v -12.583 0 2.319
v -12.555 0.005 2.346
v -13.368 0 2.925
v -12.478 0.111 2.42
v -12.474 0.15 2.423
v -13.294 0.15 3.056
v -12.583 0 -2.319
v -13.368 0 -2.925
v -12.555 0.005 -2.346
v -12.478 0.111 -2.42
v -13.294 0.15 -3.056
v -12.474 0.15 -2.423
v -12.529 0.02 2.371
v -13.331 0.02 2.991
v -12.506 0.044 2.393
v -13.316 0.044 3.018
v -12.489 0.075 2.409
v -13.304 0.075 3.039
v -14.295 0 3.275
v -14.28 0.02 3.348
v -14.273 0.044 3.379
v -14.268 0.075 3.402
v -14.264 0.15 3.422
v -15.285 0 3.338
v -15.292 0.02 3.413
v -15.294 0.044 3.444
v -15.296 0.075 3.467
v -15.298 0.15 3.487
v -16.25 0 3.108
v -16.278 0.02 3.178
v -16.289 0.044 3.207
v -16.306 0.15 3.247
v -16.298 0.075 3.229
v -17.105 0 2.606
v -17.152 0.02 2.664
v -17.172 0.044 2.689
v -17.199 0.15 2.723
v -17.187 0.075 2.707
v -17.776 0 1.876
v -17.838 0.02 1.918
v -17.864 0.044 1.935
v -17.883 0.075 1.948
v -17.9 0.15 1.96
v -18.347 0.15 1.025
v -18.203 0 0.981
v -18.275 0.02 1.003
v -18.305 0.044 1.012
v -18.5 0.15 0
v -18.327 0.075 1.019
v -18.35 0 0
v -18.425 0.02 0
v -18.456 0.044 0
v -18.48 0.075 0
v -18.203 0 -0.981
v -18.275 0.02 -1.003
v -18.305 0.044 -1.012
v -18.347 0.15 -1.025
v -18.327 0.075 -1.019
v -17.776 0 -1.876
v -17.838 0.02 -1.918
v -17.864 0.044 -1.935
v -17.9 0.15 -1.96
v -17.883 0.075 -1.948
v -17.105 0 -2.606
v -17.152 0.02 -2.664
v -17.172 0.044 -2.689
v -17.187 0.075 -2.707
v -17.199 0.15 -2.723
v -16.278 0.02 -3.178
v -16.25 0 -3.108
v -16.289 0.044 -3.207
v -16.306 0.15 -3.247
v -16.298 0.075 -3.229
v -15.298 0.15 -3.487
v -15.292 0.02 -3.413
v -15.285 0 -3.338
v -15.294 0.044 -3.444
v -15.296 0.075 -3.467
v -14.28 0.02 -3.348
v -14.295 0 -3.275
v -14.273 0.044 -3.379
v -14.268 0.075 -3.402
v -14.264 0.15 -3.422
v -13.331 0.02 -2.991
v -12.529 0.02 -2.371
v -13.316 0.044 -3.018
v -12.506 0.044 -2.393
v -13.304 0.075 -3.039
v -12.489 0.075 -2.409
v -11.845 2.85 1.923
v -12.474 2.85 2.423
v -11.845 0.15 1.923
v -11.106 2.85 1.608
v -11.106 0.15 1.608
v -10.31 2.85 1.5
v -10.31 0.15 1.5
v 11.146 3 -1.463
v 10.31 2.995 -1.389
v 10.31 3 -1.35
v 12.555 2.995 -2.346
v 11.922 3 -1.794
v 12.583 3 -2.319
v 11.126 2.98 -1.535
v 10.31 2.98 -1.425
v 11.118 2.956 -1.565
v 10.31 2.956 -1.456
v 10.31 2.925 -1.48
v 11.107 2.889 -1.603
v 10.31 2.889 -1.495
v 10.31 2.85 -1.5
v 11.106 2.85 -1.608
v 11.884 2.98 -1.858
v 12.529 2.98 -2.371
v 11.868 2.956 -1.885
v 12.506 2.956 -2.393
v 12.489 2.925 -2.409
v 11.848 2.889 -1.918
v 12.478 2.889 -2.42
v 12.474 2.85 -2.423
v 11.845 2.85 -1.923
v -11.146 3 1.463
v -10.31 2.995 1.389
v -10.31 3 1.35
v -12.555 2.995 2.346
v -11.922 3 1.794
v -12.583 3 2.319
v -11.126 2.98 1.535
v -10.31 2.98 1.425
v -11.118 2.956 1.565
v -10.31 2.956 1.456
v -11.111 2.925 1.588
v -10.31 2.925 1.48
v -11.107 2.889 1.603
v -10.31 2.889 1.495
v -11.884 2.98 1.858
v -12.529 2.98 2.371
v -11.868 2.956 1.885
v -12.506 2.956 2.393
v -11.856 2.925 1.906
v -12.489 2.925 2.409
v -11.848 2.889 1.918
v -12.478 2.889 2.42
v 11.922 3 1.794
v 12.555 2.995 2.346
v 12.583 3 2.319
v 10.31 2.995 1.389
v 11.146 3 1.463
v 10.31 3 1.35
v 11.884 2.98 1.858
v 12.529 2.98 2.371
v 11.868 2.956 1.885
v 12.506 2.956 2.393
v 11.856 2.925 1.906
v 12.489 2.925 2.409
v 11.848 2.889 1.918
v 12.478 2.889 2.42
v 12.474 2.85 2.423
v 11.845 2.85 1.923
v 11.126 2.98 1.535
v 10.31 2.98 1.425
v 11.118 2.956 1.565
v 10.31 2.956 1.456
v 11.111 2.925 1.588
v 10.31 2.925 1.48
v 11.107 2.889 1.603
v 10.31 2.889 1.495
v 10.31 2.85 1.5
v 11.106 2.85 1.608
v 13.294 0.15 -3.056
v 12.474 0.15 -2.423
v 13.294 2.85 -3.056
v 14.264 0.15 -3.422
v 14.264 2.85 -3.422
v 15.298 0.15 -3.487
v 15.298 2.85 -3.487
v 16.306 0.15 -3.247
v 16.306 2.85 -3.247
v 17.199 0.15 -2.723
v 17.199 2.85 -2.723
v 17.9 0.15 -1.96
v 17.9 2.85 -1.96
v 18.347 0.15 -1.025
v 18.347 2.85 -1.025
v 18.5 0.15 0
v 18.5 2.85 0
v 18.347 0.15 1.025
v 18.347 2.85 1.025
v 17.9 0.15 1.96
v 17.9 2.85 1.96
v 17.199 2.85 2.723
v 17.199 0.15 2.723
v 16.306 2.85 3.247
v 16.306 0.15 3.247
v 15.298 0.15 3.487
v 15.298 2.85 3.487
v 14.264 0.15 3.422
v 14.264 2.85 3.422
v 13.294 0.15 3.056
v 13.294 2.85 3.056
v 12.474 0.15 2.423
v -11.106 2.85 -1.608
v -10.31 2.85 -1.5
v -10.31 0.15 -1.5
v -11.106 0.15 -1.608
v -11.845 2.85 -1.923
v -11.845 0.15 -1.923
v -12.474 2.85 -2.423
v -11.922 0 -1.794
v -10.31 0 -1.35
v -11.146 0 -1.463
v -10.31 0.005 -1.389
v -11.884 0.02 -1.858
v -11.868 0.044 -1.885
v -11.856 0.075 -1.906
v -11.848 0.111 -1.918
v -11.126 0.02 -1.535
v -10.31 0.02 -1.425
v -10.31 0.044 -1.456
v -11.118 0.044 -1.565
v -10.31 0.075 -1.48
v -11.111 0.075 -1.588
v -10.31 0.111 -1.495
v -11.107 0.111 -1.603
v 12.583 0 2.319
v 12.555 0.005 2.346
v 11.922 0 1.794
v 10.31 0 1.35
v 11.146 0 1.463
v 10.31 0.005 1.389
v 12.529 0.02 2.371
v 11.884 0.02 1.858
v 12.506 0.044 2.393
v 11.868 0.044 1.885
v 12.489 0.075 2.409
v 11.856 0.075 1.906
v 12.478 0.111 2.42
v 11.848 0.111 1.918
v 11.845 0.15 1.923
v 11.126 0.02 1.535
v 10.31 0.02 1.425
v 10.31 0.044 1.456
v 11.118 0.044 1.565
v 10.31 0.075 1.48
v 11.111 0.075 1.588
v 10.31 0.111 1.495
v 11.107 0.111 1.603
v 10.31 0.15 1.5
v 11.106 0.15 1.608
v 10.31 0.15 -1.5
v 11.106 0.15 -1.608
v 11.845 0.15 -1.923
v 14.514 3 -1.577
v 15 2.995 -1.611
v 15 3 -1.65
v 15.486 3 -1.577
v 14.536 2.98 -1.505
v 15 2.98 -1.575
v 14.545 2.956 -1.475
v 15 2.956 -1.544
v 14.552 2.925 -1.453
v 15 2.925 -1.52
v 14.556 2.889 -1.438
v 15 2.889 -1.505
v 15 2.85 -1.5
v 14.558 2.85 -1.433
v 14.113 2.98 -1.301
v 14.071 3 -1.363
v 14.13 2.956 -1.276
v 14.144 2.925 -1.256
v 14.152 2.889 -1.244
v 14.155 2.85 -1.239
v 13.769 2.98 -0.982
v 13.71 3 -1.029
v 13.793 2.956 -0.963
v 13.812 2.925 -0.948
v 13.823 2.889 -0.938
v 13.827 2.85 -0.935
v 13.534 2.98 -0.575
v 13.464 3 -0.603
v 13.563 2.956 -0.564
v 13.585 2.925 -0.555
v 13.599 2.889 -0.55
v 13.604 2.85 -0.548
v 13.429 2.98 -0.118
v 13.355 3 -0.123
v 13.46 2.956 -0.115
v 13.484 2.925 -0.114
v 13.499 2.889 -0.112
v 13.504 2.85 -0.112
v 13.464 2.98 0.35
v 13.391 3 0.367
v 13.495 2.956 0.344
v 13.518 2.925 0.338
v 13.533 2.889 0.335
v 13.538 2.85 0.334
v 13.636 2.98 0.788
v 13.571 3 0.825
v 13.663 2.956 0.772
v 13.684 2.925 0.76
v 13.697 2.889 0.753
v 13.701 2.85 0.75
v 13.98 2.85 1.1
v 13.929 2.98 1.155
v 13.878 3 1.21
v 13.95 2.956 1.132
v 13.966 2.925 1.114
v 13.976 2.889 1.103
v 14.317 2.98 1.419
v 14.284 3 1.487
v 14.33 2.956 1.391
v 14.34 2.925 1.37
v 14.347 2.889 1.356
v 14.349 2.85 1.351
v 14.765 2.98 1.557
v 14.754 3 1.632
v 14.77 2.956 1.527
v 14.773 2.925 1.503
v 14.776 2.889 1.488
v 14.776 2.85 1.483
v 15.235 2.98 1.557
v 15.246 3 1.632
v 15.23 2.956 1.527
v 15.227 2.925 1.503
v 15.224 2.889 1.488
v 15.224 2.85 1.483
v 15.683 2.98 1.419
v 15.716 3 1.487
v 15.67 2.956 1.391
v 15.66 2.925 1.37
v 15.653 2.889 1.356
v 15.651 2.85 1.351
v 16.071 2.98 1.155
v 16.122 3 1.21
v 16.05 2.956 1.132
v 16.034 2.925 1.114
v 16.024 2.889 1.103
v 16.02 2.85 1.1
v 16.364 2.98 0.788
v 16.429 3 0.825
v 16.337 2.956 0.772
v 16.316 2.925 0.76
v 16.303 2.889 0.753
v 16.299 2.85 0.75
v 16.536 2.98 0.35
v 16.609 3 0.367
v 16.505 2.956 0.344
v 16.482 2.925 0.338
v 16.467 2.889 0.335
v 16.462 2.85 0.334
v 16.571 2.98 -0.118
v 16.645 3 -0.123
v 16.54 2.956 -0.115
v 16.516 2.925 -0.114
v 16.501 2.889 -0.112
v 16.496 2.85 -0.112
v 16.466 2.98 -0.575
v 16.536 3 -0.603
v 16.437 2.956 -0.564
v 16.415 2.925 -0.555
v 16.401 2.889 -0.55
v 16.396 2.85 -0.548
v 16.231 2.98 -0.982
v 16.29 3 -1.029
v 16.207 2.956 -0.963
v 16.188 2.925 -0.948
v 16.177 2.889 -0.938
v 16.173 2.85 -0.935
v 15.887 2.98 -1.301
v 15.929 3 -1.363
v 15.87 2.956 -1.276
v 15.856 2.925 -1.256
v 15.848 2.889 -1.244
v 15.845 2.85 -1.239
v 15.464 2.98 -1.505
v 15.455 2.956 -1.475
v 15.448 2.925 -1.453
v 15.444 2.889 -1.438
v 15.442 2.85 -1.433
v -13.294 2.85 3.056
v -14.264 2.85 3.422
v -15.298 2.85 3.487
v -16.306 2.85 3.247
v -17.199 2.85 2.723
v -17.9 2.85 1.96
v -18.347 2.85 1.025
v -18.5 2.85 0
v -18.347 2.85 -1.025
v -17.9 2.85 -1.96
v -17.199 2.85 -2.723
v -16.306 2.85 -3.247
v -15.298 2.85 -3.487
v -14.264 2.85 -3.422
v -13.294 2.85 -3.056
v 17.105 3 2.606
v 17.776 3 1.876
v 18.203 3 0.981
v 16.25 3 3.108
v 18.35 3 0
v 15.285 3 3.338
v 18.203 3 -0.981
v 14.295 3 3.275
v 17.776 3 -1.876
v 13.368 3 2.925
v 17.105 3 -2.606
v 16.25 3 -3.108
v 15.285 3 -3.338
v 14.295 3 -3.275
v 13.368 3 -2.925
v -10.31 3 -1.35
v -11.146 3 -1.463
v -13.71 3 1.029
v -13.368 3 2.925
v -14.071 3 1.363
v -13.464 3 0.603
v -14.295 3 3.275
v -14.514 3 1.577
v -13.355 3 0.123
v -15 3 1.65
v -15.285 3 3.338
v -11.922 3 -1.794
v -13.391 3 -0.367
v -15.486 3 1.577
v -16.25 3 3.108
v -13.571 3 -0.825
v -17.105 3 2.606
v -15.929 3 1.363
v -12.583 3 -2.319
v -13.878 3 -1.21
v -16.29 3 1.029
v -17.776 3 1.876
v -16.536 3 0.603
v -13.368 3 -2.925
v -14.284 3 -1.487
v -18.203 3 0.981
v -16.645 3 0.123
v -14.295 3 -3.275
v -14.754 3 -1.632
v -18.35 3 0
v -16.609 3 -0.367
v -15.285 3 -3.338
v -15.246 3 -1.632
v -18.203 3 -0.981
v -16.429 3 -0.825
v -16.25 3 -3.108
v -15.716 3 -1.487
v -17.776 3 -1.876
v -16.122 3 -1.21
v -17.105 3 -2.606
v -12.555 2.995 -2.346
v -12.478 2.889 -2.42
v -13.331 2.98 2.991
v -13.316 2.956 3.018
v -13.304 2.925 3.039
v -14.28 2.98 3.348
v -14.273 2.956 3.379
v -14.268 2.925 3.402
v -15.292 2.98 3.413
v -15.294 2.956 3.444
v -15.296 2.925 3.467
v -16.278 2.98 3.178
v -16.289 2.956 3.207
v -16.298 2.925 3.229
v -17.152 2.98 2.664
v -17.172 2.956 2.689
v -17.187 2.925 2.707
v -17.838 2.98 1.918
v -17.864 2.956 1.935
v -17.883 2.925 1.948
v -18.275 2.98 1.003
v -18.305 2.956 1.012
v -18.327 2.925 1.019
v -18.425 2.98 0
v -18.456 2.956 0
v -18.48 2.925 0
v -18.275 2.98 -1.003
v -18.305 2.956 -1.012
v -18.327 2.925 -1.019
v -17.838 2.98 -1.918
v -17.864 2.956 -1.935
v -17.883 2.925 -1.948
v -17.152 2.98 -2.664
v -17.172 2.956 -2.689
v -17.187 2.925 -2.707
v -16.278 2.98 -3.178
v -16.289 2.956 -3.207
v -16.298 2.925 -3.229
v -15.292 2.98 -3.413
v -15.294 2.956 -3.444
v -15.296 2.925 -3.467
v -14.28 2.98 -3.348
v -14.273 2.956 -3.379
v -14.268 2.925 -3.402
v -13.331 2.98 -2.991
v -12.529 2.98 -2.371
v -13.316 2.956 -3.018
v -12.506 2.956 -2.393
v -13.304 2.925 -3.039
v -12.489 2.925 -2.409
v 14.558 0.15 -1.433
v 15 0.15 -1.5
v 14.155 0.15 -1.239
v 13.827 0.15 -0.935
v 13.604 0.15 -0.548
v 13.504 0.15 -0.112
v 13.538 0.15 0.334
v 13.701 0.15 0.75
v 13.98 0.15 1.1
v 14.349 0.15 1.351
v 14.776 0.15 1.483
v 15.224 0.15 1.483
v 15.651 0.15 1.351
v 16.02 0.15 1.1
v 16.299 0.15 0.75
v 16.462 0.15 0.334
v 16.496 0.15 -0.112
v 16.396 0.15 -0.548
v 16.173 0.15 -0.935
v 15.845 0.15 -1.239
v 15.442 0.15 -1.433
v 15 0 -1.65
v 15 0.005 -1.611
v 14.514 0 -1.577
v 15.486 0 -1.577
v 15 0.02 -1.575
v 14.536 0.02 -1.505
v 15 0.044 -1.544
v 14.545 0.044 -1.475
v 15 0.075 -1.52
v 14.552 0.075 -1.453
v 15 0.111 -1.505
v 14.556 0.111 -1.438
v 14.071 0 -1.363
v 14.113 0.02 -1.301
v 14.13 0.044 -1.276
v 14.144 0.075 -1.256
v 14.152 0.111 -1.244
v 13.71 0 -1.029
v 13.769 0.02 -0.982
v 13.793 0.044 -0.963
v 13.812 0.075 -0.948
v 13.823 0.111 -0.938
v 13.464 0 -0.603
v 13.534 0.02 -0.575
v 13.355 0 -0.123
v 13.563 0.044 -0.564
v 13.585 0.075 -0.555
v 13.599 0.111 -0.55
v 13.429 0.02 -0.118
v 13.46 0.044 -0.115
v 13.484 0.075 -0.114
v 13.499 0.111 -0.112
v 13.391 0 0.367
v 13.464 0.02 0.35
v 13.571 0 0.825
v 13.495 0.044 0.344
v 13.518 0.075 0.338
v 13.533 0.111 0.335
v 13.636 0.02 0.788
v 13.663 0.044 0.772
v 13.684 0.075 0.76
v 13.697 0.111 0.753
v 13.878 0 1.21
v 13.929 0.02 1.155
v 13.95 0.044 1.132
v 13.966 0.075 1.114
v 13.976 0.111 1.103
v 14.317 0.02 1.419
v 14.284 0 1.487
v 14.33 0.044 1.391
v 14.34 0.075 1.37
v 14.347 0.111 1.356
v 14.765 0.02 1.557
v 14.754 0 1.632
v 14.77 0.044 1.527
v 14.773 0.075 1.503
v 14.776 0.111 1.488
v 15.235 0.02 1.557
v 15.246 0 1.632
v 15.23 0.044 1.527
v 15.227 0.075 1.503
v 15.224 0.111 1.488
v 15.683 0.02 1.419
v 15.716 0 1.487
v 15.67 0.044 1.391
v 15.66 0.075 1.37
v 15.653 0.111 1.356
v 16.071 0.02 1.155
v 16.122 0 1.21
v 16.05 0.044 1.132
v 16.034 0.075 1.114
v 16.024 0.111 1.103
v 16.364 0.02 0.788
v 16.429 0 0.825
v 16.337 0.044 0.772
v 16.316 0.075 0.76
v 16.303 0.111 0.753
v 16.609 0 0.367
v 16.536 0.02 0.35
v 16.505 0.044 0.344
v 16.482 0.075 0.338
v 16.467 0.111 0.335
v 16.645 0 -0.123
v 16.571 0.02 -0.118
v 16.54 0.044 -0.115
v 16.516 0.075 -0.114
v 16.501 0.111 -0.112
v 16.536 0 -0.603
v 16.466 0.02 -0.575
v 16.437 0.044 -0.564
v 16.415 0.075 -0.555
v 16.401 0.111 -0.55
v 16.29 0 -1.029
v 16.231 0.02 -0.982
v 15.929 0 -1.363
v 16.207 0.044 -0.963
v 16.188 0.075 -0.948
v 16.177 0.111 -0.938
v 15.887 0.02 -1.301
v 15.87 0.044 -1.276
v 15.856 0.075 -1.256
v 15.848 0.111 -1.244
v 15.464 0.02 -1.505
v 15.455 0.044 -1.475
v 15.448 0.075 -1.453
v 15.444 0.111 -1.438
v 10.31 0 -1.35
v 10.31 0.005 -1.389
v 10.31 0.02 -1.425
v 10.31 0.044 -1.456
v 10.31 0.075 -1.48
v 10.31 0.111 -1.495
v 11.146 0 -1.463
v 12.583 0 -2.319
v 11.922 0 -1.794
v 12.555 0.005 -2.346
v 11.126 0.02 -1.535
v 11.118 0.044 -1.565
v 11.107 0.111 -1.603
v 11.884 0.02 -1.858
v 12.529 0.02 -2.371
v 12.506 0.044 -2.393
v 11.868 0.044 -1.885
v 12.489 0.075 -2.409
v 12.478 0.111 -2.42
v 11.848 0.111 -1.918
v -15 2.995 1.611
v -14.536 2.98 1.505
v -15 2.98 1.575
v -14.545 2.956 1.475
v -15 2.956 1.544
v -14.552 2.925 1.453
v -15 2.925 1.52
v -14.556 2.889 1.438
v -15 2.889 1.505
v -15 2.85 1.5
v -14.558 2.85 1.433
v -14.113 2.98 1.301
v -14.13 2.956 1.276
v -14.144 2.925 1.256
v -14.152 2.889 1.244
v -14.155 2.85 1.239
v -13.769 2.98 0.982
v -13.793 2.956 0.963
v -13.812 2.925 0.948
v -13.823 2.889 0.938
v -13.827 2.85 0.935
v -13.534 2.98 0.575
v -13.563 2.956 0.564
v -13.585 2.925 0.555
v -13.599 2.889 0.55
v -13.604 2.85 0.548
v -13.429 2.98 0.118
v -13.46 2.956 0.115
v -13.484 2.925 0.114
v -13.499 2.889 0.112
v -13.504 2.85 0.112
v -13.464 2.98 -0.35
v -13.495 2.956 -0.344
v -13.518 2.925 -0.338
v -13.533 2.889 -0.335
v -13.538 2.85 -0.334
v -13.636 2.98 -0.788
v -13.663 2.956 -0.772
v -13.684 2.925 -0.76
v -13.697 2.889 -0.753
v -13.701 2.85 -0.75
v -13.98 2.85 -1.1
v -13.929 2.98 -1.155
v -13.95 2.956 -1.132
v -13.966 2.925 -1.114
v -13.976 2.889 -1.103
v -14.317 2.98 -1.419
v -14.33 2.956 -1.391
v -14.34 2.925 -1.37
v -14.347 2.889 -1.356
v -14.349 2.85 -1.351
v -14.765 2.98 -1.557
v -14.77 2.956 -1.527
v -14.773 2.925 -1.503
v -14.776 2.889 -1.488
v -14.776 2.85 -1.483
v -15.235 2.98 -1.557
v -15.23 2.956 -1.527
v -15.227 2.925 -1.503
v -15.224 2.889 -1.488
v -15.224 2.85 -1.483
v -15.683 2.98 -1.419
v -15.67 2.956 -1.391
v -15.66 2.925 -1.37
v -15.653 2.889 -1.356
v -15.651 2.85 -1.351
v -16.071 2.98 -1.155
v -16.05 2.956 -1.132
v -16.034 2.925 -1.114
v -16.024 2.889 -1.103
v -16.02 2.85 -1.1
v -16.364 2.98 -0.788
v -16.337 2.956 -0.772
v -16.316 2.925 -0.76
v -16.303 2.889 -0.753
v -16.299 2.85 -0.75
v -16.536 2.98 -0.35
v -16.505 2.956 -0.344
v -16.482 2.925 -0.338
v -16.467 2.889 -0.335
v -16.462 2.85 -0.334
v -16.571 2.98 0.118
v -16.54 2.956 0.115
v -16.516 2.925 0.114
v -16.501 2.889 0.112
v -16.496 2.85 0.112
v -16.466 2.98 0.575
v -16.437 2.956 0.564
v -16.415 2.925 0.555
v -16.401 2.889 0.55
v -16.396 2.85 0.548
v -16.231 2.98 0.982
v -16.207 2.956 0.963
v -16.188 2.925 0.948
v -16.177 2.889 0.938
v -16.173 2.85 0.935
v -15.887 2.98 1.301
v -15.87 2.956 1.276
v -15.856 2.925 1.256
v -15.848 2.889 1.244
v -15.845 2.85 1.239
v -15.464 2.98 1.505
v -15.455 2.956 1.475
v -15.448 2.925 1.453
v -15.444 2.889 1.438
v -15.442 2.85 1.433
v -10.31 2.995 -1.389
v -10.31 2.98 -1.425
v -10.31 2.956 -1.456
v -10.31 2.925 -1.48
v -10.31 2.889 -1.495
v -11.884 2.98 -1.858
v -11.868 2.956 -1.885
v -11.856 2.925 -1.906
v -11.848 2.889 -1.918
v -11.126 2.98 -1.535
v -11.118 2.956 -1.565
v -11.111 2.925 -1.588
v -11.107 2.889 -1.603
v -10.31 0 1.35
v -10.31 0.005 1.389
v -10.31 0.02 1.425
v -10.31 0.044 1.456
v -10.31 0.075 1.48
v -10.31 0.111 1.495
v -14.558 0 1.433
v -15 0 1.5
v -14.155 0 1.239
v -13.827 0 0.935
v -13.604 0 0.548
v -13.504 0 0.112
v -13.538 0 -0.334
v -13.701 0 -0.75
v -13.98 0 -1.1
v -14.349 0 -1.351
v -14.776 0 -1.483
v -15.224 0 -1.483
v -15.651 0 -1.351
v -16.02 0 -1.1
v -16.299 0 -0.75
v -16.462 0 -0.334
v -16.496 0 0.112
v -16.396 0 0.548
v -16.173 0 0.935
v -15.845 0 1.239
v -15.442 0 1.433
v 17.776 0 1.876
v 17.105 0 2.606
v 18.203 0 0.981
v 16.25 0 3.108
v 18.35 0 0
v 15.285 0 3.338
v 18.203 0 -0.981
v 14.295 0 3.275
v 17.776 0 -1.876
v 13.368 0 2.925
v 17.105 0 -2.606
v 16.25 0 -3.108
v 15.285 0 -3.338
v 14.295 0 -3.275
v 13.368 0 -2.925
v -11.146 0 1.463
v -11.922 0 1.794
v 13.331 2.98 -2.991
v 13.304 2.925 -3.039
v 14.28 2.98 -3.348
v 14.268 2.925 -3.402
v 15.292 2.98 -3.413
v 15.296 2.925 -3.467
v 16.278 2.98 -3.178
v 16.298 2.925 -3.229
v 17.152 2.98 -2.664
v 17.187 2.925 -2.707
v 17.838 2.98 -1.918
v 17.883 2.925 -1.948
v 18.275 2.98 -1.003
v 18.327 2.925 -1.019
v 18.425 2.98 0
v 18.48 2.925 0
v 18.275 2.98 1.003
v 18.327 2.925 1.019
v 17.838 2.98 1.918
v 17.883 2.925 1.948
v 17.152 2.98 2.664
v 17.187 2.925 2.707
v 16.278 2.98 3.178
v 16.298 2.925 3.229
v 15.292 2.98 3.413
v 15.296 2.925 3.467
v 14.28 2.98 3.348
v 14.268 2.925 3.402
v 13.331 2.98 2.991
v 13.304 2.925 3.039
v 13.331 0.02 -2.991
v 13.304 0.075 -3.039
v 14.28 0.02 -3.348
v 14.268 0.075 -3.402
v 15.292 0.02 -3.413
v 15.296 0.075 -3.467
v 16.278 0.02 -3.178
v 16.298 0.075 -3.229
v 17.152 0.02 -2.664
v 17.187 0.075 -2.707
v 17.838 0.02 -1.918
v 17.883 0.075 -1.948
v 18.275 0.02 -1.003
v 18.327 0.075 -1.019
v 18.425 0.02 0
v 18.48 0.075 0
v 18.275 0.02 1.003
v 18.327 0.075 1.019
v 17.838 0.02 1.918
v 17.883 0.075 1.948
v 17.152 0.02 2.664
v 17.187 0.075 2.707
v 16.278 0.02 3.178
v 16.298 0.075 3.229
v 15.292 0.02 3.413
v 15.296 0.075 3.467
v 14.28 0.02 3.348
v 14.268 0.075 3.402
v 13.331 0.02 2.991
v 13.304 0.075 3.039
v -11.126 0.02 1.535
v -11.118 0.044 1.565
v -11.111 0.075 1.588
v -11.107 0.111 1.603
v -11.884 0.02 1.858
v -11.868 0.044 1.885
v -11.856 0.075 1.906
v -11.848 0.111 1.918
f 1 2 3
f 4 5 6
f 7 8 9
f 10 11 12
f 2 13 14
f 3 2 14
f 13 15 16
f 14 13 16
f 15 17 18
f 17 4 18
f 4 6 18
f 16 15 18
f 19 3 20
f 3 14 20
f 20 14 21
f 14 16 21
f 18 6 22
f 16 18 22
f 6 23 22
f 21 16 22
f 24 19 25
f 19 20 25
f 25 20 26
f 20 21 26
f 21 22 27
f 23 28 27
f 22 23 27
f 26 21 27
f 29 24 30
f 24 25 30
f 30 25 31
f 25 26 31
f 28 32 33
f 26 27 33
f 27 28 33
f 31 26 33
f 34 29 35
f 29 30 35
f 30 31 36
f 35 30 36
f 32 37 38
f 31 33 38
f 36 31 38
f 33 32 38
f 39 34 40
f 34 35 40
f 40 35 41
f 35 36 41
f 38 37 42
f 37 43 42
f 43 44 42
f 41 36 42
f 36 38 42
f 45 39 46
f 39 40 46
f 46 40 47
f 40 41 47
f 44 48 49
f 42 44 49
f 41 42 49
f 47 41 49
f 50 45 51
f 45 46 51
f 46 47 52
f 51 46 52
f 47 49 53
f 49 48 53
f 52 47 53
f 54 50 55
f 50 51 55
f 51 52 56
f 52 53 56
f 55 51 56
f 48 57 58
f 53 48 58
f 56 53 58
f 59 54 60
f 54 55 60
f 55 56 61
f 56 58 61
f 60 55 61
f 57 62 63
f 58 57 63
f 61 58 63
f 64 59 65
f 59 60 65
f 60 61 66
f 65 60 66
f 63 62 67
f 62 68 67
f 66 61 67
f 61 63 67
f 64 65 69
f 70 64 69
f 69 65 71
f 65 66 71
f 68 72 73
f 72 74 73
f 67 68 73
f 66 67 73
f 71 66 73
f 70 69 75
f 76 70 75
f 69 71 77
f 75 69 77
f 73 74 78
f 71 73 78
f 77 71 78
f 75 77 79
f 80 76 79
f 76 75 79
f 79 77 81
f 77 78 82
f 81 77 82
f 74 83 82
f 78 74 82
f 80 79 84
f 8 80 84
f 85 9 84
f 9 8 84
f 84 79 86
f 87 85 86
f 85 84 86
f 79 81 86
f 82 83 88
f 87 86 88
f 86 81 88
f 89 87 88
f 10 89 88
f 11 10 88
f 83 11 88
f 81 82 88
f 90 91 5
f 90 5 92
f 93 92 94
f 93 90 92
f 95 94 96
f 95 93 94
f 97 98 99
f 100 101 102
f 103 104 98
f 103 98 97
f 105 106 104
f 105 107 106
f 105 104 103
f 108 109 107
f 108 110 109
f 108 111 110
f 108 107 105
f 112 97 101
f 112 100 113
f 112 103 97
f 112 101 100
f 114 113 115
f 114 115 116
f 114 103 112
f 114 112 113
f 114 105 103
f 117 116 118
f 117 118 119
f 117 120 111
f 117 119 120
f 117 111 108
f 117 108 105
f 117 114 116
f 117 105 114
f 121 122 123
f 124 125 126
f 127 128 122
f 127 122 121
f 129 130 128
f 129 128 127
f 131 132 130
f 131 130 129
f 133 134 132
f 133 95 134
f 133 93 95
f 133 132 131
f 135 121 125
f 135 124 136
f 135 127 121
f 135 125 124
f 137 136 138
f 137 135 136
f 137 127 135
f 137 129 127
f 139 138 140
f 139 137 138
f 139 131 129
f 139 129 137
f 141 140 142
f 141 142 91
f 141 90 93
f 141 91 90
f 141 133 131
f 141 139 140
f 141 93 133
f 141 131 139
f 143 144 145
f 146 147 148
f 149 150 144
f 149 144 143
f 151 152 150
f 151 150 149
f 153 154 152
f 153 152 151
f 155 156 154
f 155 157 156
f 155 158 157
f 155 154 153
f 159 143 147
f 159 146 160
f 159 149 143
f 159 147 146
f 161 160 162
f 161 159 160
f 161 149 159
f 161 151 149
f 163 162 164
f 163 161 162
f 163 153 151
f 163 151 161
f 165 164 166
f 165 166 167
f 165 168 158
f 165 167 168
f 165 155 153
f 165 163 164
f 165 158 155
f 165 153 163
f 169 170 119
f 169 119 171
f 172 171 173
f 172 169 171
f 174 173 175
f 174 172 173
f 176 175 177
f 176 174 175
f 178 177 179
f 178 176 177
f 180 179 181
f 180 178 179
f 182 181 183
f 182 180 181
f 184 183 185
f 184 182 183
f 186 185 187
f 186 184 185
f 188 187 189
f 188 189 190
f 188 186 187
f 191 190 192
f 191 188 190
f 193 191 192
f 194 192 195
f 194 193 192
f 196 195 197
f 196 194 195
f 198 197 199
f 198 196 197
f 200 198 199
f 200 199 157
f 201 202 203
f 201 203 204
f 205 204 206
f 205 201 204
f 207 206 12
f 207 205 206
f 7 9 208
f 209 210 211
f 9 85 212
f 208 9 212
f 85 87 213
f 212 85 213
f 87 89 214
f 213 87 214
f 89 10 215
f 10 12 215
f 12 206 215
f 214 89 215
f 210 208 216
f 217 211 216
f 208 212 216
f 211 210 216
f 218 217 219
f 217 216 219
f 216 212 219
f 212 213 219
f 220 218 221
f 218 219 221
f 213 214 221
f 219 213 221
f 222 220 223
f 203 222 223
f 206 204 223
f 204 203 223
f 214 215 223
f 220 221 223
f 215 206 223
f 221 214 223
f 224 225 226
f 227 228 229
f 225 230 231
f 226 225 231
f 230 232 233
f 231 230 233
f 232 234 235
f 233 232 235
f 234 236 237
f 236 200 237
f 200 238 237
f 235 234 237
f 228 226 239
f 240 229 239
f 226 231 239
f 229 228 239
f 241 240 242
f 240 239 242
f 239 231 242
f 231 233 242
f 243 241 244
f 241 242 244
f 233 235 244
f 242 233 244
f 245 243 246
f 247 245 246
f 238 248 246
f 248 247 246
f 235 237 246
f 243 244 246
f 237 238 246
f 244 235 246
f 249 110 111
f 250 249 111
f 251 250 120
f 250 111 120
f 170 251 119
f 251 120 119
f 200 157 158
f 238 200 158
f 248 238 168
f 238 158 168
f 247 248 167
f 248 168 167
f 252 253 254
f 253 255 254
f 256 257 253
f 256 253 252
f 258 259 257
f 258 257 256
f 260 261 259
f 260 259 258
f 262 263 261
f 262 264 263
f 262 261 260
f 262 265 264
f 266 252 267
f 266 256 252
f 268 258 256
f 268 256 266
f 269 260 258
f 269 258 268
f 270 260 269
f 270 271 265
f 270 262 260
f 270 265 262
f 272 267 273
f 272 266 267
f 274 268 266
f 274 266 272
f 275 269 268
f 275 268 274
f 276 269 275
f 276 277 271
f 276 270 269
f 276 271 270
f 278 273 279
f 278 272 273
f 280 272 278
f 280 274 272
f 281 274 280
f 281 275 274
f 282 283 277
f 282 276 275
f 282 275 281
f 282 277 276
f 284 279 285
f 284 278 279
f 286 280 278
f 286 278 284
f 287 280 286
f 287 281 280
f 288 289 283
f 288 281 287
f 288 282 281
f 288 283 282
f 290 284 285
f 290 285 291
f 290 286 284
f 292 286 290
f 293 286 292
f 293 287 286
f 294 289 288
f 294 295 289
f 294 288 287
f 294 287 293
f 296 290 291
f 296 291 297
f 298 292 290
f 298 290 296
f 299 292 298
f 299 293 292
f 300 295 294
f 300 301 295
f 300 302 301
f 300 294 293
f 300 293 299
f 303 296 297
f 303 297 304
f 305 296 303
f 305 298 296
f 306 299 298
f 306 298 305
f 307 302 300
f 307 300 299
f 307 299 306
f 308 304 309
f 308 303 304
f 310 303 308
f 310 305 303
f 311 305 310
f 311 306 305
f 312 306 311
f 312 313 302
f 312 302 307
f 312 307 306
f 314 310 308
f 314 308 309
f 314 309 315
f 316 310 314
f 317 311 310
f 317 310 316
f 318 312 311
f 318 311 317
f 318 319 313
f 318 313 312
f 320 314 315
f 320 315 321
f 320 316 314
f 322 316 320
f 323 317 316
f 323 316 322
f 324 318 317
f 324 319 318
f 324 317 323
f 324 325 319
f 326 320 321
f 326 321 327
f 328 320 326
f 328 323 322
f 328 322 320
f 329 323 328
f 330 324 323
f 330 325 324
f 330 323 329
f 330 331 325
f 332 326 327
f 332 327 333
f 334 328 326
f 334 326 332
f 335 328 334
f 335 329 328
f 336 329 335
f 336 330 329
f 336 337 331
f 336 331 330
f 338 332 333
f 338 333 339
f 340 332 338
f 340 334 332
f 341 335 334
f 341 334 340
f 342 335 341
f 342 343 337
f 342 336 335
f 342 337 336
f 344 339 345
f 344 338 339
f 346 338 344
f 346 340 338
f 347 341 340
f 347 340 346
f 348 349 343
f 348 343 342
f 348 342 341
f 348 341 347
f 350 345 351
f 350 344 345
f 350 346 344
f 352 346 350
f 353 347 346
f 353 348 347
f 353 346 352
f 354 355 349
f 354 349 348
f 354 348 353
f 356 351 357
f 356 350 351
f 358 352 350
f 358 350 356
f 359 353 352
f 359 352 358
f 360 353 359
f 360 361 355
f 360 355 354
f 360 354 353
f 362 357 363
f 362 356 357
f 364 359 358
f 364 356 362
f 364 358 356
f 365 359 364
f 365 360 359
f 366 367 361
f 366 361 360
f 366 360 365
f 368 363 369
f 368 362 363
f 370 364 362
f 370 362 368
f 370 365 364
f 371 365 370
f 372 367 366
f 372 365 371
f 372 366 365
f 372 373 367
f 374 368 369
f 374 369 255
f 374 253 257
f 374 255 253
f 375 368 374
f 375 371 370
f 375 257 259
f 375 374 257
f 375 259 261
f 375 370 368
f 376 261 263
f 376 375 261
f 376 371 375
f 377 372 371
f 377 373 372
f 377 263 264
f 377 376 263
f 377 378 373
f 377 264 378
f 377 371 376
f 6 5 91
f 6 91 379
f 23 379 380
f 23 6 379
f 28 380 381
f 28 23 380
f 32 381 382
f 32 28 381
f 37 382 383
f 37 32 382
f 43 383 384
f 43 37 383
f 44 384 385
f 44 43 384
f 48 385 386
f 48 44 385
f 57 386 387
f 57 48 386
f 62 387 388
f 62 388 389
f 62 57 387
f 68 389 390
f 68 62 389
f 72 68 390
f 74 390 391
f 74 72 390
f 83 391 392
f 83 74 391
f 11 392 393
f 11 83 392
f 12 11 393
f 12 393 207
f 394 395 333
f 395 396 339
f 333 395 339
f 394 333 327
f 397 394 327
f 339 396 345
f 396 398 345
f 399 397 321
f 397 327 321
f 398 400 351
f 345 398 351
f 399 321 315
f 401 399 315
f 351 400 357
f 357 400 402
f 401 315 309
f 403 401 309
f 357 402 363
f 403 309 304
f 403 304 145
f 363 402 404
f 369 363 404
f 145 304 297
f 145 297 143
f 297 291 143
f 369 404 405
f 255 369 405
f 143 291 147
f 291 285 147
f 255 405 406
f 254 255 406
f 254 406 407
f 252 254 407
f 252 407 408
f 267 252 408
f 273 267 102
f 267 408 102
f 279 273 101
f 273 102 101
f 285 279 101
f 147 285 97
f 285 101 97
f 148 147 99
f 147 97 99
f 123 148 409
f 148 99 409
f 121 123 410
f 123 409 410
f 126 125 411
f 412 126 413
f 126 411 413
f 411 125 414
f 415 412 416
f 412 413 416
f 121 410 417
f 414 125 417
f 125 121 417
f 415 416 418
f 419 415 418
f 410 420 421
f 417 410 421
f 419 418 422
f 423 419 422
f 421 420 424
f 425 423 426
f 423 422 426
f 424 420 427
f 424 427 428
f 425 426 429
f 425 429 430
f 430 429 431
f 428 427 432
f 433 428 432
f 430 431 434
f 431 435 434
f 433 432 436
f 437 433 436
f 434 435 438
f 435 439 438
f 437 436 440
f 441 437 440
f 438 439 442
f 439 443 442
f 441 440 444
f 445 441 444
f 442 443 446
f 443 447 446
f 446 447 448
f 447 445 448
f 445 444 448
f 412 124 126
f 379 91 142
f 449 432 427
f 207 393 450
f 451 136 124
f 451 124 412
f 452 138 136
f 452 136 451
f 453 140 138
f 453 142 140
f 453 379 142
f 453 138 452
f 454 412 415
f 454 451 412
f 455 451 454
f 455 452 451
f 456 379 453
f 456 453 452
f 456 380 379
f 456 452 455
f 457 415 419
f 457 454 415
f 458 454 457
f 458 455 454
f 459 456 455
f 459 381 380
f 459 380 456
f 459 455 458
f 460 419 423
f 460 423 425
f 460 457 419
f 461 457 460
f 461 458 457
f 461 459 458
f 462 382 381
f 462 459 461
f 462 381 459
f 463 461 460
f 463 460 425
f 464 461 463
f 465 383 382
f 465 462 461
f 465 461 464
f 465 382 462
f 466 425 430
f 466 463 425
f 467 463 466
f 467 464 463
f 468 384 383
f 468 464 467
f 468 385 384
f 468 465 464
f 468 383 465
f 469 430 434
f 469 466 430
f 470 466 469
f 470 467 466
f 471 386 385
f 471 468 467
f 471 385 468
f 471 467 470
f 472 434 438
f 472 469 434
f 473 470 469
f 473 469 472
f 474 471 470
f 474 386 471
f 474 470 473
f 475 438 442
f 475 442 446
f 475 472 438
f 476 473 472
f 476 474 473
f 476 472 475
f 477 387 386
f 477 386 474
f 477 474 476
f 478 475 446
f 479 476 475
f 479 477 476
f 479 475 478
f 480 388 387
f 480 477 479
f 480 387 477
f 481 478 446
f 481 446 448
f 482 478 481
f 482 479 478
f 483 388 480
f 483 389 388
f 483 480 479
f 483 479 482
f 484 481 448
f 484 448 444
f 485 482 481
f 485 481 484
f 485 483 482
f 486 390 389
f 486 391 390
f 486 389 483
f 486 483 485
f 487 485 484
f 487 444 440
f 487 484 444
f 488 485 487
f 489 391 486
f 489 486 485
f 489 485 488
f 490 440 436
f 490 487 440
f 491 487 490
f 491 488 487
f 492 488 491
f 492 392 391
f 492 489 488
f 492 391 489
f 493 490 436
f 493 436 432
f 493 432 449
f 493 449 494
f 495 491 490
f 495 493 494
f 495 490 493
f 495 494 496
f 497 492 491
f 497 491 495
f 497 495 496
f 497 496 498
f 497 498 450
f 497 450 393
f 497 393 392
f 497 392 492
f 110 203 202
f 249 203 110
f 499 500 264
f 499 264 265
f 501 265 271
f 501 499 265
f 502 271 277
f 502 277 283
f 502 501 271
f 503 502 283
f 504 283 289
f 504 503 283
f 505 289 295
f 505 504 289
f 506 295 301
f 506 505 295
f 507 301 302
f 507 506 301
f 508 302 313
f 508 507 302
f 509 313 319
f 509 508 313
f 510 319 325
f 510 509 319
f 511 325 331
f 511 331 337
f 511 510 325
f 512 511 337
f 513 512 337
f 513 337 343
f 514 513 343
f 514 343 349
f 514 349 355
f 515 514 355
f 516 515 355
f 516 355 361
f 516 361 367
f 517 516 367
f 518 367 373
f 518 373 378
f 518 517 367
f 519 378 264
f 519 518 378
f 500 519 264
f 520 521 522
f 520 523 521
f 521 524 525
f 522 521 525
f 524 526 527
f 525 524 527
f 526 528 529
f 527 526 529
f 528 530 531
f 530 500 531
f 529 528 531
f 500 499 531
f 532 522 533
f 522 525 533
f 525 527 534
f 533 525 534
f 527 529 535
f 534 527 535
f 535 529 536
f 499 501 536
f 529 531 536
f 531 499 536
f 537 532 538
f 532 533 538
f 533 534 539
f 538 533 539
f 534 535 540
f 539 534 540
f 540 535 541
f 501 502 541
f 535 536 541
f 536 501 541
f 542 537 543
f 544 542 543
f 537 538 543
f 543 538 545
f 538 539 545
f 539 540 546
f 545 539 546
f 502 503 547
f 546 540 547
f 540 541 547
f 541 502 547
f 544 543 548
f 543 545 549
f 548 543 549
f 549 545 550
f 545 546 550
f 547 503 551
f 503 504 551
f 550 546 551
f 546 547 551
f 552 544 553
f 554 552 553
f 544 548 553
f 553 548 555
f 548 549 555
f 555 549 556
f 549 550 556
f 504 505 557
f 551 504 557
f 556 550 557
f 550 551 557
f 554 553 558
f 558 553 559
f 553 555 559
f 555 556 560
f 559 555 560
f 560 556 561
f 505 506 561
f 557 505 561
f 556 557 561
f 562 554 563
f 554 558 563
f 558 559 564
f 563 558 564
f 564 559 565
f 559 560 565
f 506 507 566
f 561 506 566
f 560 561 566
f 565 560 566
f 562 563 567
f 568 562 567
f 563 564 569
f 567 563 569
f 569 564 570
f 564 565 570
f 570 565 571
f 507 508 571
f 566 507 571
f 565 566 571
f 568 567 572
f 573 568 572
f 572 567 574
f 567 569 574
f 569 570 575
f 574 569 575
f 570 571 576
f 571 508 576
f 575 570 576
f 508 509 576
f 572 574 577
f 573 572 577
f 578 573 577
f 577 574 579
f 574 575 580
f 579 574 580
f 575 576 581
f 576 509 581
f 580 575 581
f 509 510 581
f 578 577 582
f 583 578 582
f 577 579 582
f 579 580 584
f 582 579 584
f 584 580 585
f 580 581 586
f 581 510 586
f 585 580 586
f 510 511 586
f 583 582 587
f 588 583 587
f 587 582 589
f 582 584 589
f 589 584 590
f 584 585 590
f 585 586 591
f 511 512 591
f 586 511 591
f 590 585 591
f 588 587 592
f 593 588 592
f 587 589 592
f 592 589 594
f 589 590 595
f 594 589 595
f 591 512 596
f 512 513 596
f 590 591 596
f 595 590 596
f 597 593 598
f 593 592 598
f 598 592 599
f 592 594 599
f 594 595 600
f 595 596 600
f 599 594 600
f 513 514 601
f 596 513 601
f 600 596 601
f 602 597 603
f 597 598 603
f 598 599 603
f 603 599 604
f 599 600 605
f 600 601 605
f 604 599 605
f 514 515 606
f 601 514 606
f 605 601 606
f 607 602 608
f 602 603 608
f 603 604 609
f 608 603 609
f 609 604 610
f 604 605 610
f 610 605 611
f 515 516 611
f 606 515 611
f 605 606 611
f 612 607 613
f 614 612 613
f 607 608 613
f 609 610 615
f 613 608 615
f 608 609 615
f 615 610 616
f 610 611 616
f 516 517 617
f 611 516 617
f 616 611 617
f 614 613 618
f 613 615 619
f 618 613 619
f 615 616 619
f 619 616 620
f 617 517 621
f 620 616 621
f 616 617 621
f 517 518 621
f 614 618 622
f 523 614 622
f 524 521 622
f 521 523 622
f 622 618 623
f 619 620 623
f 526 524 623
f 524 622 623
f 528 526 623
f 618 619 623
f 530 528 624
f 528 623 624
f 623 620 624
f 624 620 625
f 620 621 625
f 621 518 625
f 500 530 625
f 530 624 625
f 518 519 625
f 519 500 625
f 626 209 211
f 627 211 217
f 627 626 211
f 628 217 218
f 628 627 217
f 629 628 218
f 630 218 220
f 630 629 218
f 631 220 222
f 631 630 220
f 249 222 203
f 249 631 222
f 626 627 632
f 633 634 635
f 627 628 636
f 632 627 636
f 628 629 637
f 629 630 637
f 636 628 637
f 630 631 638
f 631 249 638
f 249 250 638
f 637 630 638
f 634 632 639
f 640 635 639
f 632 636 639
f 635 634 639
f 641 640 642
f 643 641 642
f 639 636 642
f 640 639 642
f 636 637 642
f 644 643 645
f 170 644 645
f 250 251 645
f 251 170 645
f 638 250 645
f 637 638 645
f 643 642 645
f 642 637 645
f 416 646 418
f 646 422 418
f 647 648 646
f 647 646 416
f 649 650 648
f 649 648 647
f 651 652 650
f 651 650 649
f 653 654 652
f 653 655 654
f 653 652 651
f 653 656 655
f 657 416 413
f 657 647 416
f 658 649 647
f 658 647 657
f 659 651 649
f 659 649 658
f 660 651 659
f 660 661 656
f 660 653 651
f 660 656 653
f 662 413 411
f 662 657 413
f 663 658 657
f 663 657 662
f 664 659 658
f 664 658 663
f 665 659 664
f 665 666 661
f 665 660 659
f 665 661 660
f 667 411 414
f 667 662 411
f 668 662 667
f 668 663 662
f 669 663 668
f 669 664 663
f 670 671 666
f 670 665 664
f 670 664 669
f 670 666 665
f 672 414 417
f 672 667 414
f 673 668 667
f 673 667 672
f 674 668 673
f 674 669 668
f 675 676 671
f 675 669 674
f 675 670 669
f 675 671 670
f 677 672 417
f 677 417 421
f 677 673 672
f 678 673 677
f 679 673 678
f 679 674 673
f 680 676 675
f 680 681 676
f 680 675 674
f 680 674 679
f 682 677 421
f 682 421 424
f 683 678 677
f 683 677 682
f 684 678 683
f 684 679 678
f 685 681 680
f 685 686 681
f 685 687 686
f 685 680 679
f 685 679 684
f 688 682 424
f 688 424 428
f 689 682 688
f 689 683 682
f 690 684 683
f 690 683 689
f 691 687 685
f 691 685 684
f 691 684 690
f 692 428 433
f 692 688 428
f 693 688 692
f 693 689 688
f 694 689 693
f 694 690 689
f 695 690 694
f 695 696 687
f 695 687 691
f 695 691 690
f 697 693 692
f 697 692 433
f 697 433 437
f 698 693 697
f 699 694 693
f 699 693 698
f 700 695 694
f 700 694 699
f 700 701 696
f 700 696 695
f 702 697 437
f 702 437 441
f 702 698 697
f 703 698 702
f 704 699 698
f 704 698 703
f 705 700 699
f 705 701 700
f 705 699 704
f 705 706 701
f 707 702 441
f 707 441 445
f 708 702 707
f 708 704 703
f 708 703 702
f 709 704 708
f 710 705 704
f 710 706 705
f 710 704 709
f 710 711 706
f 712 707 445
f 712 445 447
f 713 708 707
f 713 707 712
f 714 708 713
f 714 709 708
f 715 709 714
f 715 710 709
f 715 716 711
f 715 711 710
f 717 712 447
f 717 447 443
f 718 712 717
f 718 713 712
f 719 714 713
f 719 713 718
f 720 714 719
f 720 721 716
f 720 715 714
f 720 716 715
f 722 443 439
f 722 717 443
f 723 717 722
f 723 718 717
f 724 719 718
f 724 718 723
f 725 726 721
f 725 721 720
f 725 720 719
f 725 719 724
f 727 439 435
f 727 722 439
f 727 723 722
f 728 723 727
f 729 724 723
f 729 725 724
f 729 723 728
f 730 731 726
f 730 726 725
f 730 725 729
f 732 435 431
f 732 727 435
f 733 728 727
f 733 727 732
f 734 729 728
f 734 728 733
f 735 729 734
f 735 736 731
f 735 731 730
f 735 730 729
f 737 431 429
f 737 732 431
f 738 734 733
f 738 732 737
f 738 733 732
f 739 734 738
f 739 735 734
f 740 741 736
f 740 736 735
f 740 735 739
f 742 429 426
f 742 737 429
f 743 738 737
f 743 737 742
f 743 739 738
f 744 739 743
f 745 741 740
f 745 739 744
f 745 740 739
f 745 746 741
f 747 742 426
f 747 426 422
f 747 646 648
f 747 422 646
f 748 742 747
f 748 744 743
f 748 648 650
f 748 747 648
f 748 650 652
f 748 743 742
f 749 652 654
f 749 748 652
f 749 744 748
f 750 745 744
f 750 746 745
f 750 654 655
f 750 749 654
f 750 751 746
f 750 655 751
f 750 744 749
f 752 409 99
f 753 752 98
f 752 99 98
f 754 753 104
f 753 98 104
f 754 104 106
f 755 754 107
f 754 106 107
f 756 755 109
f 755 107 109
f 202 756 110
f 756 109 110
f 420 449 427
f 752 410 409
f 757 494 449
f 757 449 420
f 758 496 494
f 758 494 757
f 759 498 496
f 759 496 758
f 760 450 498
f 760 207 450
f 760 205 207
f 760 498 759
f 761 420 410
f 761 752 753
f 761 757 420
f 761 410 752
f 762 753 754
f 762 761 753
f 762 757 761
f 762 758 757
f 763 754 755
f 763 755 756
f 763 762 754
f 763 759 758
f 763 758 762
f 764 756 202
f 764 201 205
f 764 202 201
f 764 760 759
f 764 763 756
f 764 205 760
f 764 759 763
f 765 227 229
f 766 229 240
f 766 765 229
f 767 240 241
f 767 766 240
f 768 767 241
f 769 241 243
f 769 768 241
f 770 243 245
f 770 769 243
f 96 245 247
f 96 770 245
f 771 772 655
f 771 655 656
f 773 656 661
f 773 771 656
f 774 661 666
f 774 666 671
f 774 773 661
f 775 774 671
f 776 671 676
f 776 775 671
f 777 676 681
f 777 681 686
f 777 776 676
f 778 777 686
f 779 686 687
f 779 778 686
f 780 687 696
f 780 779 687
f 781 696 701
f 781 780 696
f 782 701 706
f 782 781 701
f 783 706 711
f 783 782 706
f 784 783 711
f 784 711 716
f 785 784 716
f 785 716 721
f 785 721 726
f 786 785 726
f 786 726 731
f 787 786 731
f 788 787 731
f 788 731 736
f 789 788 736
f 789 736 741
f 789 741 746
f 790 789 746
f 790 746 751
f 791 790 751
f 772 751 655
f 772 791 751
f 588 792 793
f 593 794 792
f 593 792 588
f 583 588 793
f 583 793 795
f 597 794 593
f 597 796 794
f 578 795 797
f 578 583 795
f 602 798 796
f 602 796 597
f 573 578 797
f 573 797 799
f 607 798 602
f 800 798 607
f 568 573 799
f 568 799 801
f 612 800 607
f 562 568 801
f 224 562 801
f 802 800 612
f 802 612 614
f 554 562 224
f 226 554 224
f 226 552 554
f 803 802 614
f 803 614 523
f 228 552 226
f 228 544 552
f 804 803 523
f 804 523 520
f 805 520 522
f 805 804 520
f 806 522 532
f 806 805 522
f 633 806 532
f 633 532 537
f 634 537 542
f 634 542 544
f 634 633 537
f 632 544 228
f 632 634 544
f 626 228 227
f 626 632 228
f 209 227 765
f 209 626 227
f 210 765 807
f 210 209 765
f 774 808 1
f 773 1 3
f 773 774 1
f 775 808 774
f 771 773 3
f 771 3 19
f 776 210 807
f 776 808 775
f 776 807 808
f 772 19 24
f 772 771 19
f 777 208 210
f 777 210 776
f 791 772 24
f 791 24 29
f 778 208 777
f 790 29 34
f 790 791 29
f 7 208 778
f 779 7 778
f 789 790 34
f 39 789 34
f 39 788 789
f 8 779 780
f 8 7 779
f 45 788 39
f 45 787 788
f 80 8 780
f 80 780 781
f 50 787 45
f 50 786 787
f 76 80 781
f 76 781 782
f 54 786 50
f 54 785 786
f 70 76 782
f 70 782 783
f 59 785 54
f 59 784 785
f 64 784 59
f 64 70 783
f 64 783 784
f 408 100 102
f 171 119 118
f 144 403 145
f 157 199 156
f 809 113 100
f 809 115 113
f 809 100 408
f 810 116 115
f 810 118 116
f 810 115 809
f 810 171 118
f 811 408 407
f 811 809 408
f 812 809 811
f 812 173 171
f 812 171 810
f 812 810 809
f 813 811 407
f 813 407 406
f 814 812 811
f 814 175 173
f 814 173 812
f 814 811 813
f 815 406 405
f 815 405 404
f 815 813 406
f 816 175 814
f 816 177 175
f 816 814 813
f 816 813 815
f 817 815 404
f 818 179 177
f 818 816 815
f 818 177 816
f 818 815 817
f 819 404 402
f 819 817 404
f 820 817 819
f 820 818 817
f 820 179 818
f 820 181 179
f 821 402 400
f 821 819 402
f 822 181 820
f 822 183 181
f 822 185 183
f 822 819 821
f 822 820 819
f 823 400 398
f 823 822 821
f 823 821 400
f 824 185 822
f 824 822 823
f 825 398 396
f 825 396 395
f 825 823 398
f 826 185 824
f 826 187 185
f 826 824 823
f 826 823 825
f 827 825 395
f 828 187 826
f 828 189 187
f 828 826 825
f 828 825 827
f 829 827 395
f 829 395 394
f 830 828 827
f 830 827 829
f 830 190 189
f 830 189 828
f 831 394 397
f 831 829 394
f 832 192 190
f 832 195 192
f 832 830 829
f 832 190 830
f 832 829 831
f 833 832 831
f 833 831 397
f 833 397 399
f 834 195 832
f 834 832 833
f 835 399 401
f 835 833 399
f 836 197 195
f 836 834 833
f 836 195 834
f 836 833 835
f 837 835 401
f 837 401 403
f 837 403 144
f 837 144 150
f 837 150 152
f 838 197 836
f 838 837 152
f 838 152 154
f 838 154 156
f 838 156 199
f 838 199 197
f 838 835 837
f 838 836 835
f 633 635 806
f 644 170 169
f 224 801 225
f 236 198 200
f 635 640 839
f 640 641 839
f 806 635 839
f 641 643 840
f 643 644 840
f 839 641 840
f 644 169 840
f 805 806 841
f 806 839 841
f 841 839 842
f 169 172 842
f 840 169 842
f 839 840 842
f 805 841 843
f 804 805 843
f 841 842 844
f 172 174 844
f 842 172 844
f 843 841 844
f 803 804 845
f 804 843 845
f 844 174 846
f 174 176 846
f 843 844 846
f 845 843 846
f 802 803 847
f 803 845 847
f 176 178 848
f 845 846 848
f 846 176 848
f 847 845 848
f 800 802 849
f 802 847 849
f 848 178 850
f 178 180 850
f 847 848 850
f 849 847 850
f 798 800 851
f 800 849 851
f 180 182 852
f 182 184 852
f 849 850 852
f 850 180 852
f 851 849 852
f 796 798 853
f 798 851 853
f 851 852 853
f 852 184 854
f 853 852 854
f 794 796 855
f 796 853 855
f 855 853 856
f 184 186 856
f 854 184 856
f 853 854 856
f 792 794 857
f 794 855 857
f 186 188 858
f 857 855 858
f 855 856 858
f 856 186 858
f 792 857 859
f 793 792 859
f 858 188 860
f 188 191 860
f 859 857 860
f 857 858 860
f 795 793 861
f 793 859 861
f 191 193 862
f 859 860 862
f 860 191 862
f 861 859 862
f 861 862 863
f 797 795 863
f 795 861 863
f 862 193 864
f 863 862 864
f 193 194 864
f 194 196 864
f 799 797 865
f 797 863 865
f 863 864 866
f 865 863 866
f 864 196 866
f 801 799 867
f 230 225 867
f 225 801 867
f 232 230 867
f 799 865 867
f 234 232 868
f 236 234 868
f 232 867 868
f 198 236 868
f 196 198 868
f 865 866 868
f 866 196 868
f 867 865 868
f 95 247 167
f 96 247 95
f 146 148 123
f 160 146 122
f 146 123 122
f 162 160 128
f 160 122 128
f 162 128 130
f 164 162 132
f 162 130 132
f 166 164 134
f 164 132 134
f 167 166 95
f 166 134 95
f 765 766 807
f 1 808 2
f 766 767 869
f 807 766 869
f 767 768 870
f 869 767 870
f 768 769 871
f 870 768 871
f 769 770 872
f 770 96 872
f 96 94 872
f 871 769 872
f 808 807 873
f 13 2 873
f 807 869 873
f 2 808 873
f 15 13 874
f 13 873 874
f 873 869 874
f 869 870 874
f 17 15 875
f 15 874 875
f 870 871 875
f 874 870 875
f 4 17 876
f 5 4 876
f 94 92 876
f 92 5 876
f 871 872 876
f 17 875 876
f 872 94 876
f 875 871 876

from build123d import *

# Parameters (mm, degrees)
SKETCH_1_R      = 1.5
EXTRUDE_1_DEPTH = 3
FILLET_1_R      = 3
FILLET_2_R      = 0.15


with BuildPart() as part:
    # 草图1 → 凸台-拉伸1 (new body)
    with BuildSketch(Plane(origin=(0, 0, 0), x_dir=(1, 0, 0), z_dir=(0, 1, 0))):
        with BuildLine():
            Line((-11.83772234, 1.5), (11.83772234, 1.5))
            ThreePointArc((11.83772234, 1.5), (18.5, 0), (11.83772234, -1.5))
            Line((11.83772234, -1.5), (-11.83772234, -1.5))
            ThreePointArc((-11.83772234, -1.5), (-18.5, 0), (-11.83772234, 1.5))
        make_face()
        with Locations(Location((-15, 0, 0), (0, 0, 270))):
            Circle(SKETCH_1_R, mode=Mode.SUBTRACT)
        with Locations(Location((15, 0, 0), (0, 0, 90))):
            Circle(SKETCH_1_R, mode=Mode.SUBTRACT)
    extrude(amount=EXTRUDE_1_DEPTH)

    # 圆角1
    fillet_1_edges = [part.edges().sort_by_distance(p)[0] for p in [
        (-11.83772234, 1.5, -1.5),
        (11.83772234, 1.5, -1.5),
        (11.83772234, 1.5, 1.5),
        (-11.83772234, 1.5, 1.5),
    ]]
    fillet(fillet_1_edges, radius=FILLET_1_R)

    # 圆角2
    fillet_2_edges = [part.edges().sort_by_distance(p)[0] for p in [
        (-15, 3, -1.5),
        (15, 0, 1.5),
        (15, 3, 1.5),
        (18.5, 0, 0),
        (18.5, 3, 0),
        (0, 0, 1.5),
        (0, 3, 1.5),
        (-18.5, 0, 0),
        (-18.5, 3, 0),
        (0, 0, -1.5),
        (0, 3, -1.5),
        (11.486281051, 0, 1.740401367),
        (11.486281051, 3, 1.740401367),
        (-11.486281051, 0, 1.740401367),
        (-11.486281051, 3, 1.740401367),
        (-11.486281051, 0, -1.740401367),
        (-11.486281051, 3, -1.740401367),
        (11.486281051, 0, -1.740401367),
        (11.486281051, 3, -1.740401367),
    ]]
    fillet(fillet_2_edges, radius=FILLET_2_R)


solid = part.part
